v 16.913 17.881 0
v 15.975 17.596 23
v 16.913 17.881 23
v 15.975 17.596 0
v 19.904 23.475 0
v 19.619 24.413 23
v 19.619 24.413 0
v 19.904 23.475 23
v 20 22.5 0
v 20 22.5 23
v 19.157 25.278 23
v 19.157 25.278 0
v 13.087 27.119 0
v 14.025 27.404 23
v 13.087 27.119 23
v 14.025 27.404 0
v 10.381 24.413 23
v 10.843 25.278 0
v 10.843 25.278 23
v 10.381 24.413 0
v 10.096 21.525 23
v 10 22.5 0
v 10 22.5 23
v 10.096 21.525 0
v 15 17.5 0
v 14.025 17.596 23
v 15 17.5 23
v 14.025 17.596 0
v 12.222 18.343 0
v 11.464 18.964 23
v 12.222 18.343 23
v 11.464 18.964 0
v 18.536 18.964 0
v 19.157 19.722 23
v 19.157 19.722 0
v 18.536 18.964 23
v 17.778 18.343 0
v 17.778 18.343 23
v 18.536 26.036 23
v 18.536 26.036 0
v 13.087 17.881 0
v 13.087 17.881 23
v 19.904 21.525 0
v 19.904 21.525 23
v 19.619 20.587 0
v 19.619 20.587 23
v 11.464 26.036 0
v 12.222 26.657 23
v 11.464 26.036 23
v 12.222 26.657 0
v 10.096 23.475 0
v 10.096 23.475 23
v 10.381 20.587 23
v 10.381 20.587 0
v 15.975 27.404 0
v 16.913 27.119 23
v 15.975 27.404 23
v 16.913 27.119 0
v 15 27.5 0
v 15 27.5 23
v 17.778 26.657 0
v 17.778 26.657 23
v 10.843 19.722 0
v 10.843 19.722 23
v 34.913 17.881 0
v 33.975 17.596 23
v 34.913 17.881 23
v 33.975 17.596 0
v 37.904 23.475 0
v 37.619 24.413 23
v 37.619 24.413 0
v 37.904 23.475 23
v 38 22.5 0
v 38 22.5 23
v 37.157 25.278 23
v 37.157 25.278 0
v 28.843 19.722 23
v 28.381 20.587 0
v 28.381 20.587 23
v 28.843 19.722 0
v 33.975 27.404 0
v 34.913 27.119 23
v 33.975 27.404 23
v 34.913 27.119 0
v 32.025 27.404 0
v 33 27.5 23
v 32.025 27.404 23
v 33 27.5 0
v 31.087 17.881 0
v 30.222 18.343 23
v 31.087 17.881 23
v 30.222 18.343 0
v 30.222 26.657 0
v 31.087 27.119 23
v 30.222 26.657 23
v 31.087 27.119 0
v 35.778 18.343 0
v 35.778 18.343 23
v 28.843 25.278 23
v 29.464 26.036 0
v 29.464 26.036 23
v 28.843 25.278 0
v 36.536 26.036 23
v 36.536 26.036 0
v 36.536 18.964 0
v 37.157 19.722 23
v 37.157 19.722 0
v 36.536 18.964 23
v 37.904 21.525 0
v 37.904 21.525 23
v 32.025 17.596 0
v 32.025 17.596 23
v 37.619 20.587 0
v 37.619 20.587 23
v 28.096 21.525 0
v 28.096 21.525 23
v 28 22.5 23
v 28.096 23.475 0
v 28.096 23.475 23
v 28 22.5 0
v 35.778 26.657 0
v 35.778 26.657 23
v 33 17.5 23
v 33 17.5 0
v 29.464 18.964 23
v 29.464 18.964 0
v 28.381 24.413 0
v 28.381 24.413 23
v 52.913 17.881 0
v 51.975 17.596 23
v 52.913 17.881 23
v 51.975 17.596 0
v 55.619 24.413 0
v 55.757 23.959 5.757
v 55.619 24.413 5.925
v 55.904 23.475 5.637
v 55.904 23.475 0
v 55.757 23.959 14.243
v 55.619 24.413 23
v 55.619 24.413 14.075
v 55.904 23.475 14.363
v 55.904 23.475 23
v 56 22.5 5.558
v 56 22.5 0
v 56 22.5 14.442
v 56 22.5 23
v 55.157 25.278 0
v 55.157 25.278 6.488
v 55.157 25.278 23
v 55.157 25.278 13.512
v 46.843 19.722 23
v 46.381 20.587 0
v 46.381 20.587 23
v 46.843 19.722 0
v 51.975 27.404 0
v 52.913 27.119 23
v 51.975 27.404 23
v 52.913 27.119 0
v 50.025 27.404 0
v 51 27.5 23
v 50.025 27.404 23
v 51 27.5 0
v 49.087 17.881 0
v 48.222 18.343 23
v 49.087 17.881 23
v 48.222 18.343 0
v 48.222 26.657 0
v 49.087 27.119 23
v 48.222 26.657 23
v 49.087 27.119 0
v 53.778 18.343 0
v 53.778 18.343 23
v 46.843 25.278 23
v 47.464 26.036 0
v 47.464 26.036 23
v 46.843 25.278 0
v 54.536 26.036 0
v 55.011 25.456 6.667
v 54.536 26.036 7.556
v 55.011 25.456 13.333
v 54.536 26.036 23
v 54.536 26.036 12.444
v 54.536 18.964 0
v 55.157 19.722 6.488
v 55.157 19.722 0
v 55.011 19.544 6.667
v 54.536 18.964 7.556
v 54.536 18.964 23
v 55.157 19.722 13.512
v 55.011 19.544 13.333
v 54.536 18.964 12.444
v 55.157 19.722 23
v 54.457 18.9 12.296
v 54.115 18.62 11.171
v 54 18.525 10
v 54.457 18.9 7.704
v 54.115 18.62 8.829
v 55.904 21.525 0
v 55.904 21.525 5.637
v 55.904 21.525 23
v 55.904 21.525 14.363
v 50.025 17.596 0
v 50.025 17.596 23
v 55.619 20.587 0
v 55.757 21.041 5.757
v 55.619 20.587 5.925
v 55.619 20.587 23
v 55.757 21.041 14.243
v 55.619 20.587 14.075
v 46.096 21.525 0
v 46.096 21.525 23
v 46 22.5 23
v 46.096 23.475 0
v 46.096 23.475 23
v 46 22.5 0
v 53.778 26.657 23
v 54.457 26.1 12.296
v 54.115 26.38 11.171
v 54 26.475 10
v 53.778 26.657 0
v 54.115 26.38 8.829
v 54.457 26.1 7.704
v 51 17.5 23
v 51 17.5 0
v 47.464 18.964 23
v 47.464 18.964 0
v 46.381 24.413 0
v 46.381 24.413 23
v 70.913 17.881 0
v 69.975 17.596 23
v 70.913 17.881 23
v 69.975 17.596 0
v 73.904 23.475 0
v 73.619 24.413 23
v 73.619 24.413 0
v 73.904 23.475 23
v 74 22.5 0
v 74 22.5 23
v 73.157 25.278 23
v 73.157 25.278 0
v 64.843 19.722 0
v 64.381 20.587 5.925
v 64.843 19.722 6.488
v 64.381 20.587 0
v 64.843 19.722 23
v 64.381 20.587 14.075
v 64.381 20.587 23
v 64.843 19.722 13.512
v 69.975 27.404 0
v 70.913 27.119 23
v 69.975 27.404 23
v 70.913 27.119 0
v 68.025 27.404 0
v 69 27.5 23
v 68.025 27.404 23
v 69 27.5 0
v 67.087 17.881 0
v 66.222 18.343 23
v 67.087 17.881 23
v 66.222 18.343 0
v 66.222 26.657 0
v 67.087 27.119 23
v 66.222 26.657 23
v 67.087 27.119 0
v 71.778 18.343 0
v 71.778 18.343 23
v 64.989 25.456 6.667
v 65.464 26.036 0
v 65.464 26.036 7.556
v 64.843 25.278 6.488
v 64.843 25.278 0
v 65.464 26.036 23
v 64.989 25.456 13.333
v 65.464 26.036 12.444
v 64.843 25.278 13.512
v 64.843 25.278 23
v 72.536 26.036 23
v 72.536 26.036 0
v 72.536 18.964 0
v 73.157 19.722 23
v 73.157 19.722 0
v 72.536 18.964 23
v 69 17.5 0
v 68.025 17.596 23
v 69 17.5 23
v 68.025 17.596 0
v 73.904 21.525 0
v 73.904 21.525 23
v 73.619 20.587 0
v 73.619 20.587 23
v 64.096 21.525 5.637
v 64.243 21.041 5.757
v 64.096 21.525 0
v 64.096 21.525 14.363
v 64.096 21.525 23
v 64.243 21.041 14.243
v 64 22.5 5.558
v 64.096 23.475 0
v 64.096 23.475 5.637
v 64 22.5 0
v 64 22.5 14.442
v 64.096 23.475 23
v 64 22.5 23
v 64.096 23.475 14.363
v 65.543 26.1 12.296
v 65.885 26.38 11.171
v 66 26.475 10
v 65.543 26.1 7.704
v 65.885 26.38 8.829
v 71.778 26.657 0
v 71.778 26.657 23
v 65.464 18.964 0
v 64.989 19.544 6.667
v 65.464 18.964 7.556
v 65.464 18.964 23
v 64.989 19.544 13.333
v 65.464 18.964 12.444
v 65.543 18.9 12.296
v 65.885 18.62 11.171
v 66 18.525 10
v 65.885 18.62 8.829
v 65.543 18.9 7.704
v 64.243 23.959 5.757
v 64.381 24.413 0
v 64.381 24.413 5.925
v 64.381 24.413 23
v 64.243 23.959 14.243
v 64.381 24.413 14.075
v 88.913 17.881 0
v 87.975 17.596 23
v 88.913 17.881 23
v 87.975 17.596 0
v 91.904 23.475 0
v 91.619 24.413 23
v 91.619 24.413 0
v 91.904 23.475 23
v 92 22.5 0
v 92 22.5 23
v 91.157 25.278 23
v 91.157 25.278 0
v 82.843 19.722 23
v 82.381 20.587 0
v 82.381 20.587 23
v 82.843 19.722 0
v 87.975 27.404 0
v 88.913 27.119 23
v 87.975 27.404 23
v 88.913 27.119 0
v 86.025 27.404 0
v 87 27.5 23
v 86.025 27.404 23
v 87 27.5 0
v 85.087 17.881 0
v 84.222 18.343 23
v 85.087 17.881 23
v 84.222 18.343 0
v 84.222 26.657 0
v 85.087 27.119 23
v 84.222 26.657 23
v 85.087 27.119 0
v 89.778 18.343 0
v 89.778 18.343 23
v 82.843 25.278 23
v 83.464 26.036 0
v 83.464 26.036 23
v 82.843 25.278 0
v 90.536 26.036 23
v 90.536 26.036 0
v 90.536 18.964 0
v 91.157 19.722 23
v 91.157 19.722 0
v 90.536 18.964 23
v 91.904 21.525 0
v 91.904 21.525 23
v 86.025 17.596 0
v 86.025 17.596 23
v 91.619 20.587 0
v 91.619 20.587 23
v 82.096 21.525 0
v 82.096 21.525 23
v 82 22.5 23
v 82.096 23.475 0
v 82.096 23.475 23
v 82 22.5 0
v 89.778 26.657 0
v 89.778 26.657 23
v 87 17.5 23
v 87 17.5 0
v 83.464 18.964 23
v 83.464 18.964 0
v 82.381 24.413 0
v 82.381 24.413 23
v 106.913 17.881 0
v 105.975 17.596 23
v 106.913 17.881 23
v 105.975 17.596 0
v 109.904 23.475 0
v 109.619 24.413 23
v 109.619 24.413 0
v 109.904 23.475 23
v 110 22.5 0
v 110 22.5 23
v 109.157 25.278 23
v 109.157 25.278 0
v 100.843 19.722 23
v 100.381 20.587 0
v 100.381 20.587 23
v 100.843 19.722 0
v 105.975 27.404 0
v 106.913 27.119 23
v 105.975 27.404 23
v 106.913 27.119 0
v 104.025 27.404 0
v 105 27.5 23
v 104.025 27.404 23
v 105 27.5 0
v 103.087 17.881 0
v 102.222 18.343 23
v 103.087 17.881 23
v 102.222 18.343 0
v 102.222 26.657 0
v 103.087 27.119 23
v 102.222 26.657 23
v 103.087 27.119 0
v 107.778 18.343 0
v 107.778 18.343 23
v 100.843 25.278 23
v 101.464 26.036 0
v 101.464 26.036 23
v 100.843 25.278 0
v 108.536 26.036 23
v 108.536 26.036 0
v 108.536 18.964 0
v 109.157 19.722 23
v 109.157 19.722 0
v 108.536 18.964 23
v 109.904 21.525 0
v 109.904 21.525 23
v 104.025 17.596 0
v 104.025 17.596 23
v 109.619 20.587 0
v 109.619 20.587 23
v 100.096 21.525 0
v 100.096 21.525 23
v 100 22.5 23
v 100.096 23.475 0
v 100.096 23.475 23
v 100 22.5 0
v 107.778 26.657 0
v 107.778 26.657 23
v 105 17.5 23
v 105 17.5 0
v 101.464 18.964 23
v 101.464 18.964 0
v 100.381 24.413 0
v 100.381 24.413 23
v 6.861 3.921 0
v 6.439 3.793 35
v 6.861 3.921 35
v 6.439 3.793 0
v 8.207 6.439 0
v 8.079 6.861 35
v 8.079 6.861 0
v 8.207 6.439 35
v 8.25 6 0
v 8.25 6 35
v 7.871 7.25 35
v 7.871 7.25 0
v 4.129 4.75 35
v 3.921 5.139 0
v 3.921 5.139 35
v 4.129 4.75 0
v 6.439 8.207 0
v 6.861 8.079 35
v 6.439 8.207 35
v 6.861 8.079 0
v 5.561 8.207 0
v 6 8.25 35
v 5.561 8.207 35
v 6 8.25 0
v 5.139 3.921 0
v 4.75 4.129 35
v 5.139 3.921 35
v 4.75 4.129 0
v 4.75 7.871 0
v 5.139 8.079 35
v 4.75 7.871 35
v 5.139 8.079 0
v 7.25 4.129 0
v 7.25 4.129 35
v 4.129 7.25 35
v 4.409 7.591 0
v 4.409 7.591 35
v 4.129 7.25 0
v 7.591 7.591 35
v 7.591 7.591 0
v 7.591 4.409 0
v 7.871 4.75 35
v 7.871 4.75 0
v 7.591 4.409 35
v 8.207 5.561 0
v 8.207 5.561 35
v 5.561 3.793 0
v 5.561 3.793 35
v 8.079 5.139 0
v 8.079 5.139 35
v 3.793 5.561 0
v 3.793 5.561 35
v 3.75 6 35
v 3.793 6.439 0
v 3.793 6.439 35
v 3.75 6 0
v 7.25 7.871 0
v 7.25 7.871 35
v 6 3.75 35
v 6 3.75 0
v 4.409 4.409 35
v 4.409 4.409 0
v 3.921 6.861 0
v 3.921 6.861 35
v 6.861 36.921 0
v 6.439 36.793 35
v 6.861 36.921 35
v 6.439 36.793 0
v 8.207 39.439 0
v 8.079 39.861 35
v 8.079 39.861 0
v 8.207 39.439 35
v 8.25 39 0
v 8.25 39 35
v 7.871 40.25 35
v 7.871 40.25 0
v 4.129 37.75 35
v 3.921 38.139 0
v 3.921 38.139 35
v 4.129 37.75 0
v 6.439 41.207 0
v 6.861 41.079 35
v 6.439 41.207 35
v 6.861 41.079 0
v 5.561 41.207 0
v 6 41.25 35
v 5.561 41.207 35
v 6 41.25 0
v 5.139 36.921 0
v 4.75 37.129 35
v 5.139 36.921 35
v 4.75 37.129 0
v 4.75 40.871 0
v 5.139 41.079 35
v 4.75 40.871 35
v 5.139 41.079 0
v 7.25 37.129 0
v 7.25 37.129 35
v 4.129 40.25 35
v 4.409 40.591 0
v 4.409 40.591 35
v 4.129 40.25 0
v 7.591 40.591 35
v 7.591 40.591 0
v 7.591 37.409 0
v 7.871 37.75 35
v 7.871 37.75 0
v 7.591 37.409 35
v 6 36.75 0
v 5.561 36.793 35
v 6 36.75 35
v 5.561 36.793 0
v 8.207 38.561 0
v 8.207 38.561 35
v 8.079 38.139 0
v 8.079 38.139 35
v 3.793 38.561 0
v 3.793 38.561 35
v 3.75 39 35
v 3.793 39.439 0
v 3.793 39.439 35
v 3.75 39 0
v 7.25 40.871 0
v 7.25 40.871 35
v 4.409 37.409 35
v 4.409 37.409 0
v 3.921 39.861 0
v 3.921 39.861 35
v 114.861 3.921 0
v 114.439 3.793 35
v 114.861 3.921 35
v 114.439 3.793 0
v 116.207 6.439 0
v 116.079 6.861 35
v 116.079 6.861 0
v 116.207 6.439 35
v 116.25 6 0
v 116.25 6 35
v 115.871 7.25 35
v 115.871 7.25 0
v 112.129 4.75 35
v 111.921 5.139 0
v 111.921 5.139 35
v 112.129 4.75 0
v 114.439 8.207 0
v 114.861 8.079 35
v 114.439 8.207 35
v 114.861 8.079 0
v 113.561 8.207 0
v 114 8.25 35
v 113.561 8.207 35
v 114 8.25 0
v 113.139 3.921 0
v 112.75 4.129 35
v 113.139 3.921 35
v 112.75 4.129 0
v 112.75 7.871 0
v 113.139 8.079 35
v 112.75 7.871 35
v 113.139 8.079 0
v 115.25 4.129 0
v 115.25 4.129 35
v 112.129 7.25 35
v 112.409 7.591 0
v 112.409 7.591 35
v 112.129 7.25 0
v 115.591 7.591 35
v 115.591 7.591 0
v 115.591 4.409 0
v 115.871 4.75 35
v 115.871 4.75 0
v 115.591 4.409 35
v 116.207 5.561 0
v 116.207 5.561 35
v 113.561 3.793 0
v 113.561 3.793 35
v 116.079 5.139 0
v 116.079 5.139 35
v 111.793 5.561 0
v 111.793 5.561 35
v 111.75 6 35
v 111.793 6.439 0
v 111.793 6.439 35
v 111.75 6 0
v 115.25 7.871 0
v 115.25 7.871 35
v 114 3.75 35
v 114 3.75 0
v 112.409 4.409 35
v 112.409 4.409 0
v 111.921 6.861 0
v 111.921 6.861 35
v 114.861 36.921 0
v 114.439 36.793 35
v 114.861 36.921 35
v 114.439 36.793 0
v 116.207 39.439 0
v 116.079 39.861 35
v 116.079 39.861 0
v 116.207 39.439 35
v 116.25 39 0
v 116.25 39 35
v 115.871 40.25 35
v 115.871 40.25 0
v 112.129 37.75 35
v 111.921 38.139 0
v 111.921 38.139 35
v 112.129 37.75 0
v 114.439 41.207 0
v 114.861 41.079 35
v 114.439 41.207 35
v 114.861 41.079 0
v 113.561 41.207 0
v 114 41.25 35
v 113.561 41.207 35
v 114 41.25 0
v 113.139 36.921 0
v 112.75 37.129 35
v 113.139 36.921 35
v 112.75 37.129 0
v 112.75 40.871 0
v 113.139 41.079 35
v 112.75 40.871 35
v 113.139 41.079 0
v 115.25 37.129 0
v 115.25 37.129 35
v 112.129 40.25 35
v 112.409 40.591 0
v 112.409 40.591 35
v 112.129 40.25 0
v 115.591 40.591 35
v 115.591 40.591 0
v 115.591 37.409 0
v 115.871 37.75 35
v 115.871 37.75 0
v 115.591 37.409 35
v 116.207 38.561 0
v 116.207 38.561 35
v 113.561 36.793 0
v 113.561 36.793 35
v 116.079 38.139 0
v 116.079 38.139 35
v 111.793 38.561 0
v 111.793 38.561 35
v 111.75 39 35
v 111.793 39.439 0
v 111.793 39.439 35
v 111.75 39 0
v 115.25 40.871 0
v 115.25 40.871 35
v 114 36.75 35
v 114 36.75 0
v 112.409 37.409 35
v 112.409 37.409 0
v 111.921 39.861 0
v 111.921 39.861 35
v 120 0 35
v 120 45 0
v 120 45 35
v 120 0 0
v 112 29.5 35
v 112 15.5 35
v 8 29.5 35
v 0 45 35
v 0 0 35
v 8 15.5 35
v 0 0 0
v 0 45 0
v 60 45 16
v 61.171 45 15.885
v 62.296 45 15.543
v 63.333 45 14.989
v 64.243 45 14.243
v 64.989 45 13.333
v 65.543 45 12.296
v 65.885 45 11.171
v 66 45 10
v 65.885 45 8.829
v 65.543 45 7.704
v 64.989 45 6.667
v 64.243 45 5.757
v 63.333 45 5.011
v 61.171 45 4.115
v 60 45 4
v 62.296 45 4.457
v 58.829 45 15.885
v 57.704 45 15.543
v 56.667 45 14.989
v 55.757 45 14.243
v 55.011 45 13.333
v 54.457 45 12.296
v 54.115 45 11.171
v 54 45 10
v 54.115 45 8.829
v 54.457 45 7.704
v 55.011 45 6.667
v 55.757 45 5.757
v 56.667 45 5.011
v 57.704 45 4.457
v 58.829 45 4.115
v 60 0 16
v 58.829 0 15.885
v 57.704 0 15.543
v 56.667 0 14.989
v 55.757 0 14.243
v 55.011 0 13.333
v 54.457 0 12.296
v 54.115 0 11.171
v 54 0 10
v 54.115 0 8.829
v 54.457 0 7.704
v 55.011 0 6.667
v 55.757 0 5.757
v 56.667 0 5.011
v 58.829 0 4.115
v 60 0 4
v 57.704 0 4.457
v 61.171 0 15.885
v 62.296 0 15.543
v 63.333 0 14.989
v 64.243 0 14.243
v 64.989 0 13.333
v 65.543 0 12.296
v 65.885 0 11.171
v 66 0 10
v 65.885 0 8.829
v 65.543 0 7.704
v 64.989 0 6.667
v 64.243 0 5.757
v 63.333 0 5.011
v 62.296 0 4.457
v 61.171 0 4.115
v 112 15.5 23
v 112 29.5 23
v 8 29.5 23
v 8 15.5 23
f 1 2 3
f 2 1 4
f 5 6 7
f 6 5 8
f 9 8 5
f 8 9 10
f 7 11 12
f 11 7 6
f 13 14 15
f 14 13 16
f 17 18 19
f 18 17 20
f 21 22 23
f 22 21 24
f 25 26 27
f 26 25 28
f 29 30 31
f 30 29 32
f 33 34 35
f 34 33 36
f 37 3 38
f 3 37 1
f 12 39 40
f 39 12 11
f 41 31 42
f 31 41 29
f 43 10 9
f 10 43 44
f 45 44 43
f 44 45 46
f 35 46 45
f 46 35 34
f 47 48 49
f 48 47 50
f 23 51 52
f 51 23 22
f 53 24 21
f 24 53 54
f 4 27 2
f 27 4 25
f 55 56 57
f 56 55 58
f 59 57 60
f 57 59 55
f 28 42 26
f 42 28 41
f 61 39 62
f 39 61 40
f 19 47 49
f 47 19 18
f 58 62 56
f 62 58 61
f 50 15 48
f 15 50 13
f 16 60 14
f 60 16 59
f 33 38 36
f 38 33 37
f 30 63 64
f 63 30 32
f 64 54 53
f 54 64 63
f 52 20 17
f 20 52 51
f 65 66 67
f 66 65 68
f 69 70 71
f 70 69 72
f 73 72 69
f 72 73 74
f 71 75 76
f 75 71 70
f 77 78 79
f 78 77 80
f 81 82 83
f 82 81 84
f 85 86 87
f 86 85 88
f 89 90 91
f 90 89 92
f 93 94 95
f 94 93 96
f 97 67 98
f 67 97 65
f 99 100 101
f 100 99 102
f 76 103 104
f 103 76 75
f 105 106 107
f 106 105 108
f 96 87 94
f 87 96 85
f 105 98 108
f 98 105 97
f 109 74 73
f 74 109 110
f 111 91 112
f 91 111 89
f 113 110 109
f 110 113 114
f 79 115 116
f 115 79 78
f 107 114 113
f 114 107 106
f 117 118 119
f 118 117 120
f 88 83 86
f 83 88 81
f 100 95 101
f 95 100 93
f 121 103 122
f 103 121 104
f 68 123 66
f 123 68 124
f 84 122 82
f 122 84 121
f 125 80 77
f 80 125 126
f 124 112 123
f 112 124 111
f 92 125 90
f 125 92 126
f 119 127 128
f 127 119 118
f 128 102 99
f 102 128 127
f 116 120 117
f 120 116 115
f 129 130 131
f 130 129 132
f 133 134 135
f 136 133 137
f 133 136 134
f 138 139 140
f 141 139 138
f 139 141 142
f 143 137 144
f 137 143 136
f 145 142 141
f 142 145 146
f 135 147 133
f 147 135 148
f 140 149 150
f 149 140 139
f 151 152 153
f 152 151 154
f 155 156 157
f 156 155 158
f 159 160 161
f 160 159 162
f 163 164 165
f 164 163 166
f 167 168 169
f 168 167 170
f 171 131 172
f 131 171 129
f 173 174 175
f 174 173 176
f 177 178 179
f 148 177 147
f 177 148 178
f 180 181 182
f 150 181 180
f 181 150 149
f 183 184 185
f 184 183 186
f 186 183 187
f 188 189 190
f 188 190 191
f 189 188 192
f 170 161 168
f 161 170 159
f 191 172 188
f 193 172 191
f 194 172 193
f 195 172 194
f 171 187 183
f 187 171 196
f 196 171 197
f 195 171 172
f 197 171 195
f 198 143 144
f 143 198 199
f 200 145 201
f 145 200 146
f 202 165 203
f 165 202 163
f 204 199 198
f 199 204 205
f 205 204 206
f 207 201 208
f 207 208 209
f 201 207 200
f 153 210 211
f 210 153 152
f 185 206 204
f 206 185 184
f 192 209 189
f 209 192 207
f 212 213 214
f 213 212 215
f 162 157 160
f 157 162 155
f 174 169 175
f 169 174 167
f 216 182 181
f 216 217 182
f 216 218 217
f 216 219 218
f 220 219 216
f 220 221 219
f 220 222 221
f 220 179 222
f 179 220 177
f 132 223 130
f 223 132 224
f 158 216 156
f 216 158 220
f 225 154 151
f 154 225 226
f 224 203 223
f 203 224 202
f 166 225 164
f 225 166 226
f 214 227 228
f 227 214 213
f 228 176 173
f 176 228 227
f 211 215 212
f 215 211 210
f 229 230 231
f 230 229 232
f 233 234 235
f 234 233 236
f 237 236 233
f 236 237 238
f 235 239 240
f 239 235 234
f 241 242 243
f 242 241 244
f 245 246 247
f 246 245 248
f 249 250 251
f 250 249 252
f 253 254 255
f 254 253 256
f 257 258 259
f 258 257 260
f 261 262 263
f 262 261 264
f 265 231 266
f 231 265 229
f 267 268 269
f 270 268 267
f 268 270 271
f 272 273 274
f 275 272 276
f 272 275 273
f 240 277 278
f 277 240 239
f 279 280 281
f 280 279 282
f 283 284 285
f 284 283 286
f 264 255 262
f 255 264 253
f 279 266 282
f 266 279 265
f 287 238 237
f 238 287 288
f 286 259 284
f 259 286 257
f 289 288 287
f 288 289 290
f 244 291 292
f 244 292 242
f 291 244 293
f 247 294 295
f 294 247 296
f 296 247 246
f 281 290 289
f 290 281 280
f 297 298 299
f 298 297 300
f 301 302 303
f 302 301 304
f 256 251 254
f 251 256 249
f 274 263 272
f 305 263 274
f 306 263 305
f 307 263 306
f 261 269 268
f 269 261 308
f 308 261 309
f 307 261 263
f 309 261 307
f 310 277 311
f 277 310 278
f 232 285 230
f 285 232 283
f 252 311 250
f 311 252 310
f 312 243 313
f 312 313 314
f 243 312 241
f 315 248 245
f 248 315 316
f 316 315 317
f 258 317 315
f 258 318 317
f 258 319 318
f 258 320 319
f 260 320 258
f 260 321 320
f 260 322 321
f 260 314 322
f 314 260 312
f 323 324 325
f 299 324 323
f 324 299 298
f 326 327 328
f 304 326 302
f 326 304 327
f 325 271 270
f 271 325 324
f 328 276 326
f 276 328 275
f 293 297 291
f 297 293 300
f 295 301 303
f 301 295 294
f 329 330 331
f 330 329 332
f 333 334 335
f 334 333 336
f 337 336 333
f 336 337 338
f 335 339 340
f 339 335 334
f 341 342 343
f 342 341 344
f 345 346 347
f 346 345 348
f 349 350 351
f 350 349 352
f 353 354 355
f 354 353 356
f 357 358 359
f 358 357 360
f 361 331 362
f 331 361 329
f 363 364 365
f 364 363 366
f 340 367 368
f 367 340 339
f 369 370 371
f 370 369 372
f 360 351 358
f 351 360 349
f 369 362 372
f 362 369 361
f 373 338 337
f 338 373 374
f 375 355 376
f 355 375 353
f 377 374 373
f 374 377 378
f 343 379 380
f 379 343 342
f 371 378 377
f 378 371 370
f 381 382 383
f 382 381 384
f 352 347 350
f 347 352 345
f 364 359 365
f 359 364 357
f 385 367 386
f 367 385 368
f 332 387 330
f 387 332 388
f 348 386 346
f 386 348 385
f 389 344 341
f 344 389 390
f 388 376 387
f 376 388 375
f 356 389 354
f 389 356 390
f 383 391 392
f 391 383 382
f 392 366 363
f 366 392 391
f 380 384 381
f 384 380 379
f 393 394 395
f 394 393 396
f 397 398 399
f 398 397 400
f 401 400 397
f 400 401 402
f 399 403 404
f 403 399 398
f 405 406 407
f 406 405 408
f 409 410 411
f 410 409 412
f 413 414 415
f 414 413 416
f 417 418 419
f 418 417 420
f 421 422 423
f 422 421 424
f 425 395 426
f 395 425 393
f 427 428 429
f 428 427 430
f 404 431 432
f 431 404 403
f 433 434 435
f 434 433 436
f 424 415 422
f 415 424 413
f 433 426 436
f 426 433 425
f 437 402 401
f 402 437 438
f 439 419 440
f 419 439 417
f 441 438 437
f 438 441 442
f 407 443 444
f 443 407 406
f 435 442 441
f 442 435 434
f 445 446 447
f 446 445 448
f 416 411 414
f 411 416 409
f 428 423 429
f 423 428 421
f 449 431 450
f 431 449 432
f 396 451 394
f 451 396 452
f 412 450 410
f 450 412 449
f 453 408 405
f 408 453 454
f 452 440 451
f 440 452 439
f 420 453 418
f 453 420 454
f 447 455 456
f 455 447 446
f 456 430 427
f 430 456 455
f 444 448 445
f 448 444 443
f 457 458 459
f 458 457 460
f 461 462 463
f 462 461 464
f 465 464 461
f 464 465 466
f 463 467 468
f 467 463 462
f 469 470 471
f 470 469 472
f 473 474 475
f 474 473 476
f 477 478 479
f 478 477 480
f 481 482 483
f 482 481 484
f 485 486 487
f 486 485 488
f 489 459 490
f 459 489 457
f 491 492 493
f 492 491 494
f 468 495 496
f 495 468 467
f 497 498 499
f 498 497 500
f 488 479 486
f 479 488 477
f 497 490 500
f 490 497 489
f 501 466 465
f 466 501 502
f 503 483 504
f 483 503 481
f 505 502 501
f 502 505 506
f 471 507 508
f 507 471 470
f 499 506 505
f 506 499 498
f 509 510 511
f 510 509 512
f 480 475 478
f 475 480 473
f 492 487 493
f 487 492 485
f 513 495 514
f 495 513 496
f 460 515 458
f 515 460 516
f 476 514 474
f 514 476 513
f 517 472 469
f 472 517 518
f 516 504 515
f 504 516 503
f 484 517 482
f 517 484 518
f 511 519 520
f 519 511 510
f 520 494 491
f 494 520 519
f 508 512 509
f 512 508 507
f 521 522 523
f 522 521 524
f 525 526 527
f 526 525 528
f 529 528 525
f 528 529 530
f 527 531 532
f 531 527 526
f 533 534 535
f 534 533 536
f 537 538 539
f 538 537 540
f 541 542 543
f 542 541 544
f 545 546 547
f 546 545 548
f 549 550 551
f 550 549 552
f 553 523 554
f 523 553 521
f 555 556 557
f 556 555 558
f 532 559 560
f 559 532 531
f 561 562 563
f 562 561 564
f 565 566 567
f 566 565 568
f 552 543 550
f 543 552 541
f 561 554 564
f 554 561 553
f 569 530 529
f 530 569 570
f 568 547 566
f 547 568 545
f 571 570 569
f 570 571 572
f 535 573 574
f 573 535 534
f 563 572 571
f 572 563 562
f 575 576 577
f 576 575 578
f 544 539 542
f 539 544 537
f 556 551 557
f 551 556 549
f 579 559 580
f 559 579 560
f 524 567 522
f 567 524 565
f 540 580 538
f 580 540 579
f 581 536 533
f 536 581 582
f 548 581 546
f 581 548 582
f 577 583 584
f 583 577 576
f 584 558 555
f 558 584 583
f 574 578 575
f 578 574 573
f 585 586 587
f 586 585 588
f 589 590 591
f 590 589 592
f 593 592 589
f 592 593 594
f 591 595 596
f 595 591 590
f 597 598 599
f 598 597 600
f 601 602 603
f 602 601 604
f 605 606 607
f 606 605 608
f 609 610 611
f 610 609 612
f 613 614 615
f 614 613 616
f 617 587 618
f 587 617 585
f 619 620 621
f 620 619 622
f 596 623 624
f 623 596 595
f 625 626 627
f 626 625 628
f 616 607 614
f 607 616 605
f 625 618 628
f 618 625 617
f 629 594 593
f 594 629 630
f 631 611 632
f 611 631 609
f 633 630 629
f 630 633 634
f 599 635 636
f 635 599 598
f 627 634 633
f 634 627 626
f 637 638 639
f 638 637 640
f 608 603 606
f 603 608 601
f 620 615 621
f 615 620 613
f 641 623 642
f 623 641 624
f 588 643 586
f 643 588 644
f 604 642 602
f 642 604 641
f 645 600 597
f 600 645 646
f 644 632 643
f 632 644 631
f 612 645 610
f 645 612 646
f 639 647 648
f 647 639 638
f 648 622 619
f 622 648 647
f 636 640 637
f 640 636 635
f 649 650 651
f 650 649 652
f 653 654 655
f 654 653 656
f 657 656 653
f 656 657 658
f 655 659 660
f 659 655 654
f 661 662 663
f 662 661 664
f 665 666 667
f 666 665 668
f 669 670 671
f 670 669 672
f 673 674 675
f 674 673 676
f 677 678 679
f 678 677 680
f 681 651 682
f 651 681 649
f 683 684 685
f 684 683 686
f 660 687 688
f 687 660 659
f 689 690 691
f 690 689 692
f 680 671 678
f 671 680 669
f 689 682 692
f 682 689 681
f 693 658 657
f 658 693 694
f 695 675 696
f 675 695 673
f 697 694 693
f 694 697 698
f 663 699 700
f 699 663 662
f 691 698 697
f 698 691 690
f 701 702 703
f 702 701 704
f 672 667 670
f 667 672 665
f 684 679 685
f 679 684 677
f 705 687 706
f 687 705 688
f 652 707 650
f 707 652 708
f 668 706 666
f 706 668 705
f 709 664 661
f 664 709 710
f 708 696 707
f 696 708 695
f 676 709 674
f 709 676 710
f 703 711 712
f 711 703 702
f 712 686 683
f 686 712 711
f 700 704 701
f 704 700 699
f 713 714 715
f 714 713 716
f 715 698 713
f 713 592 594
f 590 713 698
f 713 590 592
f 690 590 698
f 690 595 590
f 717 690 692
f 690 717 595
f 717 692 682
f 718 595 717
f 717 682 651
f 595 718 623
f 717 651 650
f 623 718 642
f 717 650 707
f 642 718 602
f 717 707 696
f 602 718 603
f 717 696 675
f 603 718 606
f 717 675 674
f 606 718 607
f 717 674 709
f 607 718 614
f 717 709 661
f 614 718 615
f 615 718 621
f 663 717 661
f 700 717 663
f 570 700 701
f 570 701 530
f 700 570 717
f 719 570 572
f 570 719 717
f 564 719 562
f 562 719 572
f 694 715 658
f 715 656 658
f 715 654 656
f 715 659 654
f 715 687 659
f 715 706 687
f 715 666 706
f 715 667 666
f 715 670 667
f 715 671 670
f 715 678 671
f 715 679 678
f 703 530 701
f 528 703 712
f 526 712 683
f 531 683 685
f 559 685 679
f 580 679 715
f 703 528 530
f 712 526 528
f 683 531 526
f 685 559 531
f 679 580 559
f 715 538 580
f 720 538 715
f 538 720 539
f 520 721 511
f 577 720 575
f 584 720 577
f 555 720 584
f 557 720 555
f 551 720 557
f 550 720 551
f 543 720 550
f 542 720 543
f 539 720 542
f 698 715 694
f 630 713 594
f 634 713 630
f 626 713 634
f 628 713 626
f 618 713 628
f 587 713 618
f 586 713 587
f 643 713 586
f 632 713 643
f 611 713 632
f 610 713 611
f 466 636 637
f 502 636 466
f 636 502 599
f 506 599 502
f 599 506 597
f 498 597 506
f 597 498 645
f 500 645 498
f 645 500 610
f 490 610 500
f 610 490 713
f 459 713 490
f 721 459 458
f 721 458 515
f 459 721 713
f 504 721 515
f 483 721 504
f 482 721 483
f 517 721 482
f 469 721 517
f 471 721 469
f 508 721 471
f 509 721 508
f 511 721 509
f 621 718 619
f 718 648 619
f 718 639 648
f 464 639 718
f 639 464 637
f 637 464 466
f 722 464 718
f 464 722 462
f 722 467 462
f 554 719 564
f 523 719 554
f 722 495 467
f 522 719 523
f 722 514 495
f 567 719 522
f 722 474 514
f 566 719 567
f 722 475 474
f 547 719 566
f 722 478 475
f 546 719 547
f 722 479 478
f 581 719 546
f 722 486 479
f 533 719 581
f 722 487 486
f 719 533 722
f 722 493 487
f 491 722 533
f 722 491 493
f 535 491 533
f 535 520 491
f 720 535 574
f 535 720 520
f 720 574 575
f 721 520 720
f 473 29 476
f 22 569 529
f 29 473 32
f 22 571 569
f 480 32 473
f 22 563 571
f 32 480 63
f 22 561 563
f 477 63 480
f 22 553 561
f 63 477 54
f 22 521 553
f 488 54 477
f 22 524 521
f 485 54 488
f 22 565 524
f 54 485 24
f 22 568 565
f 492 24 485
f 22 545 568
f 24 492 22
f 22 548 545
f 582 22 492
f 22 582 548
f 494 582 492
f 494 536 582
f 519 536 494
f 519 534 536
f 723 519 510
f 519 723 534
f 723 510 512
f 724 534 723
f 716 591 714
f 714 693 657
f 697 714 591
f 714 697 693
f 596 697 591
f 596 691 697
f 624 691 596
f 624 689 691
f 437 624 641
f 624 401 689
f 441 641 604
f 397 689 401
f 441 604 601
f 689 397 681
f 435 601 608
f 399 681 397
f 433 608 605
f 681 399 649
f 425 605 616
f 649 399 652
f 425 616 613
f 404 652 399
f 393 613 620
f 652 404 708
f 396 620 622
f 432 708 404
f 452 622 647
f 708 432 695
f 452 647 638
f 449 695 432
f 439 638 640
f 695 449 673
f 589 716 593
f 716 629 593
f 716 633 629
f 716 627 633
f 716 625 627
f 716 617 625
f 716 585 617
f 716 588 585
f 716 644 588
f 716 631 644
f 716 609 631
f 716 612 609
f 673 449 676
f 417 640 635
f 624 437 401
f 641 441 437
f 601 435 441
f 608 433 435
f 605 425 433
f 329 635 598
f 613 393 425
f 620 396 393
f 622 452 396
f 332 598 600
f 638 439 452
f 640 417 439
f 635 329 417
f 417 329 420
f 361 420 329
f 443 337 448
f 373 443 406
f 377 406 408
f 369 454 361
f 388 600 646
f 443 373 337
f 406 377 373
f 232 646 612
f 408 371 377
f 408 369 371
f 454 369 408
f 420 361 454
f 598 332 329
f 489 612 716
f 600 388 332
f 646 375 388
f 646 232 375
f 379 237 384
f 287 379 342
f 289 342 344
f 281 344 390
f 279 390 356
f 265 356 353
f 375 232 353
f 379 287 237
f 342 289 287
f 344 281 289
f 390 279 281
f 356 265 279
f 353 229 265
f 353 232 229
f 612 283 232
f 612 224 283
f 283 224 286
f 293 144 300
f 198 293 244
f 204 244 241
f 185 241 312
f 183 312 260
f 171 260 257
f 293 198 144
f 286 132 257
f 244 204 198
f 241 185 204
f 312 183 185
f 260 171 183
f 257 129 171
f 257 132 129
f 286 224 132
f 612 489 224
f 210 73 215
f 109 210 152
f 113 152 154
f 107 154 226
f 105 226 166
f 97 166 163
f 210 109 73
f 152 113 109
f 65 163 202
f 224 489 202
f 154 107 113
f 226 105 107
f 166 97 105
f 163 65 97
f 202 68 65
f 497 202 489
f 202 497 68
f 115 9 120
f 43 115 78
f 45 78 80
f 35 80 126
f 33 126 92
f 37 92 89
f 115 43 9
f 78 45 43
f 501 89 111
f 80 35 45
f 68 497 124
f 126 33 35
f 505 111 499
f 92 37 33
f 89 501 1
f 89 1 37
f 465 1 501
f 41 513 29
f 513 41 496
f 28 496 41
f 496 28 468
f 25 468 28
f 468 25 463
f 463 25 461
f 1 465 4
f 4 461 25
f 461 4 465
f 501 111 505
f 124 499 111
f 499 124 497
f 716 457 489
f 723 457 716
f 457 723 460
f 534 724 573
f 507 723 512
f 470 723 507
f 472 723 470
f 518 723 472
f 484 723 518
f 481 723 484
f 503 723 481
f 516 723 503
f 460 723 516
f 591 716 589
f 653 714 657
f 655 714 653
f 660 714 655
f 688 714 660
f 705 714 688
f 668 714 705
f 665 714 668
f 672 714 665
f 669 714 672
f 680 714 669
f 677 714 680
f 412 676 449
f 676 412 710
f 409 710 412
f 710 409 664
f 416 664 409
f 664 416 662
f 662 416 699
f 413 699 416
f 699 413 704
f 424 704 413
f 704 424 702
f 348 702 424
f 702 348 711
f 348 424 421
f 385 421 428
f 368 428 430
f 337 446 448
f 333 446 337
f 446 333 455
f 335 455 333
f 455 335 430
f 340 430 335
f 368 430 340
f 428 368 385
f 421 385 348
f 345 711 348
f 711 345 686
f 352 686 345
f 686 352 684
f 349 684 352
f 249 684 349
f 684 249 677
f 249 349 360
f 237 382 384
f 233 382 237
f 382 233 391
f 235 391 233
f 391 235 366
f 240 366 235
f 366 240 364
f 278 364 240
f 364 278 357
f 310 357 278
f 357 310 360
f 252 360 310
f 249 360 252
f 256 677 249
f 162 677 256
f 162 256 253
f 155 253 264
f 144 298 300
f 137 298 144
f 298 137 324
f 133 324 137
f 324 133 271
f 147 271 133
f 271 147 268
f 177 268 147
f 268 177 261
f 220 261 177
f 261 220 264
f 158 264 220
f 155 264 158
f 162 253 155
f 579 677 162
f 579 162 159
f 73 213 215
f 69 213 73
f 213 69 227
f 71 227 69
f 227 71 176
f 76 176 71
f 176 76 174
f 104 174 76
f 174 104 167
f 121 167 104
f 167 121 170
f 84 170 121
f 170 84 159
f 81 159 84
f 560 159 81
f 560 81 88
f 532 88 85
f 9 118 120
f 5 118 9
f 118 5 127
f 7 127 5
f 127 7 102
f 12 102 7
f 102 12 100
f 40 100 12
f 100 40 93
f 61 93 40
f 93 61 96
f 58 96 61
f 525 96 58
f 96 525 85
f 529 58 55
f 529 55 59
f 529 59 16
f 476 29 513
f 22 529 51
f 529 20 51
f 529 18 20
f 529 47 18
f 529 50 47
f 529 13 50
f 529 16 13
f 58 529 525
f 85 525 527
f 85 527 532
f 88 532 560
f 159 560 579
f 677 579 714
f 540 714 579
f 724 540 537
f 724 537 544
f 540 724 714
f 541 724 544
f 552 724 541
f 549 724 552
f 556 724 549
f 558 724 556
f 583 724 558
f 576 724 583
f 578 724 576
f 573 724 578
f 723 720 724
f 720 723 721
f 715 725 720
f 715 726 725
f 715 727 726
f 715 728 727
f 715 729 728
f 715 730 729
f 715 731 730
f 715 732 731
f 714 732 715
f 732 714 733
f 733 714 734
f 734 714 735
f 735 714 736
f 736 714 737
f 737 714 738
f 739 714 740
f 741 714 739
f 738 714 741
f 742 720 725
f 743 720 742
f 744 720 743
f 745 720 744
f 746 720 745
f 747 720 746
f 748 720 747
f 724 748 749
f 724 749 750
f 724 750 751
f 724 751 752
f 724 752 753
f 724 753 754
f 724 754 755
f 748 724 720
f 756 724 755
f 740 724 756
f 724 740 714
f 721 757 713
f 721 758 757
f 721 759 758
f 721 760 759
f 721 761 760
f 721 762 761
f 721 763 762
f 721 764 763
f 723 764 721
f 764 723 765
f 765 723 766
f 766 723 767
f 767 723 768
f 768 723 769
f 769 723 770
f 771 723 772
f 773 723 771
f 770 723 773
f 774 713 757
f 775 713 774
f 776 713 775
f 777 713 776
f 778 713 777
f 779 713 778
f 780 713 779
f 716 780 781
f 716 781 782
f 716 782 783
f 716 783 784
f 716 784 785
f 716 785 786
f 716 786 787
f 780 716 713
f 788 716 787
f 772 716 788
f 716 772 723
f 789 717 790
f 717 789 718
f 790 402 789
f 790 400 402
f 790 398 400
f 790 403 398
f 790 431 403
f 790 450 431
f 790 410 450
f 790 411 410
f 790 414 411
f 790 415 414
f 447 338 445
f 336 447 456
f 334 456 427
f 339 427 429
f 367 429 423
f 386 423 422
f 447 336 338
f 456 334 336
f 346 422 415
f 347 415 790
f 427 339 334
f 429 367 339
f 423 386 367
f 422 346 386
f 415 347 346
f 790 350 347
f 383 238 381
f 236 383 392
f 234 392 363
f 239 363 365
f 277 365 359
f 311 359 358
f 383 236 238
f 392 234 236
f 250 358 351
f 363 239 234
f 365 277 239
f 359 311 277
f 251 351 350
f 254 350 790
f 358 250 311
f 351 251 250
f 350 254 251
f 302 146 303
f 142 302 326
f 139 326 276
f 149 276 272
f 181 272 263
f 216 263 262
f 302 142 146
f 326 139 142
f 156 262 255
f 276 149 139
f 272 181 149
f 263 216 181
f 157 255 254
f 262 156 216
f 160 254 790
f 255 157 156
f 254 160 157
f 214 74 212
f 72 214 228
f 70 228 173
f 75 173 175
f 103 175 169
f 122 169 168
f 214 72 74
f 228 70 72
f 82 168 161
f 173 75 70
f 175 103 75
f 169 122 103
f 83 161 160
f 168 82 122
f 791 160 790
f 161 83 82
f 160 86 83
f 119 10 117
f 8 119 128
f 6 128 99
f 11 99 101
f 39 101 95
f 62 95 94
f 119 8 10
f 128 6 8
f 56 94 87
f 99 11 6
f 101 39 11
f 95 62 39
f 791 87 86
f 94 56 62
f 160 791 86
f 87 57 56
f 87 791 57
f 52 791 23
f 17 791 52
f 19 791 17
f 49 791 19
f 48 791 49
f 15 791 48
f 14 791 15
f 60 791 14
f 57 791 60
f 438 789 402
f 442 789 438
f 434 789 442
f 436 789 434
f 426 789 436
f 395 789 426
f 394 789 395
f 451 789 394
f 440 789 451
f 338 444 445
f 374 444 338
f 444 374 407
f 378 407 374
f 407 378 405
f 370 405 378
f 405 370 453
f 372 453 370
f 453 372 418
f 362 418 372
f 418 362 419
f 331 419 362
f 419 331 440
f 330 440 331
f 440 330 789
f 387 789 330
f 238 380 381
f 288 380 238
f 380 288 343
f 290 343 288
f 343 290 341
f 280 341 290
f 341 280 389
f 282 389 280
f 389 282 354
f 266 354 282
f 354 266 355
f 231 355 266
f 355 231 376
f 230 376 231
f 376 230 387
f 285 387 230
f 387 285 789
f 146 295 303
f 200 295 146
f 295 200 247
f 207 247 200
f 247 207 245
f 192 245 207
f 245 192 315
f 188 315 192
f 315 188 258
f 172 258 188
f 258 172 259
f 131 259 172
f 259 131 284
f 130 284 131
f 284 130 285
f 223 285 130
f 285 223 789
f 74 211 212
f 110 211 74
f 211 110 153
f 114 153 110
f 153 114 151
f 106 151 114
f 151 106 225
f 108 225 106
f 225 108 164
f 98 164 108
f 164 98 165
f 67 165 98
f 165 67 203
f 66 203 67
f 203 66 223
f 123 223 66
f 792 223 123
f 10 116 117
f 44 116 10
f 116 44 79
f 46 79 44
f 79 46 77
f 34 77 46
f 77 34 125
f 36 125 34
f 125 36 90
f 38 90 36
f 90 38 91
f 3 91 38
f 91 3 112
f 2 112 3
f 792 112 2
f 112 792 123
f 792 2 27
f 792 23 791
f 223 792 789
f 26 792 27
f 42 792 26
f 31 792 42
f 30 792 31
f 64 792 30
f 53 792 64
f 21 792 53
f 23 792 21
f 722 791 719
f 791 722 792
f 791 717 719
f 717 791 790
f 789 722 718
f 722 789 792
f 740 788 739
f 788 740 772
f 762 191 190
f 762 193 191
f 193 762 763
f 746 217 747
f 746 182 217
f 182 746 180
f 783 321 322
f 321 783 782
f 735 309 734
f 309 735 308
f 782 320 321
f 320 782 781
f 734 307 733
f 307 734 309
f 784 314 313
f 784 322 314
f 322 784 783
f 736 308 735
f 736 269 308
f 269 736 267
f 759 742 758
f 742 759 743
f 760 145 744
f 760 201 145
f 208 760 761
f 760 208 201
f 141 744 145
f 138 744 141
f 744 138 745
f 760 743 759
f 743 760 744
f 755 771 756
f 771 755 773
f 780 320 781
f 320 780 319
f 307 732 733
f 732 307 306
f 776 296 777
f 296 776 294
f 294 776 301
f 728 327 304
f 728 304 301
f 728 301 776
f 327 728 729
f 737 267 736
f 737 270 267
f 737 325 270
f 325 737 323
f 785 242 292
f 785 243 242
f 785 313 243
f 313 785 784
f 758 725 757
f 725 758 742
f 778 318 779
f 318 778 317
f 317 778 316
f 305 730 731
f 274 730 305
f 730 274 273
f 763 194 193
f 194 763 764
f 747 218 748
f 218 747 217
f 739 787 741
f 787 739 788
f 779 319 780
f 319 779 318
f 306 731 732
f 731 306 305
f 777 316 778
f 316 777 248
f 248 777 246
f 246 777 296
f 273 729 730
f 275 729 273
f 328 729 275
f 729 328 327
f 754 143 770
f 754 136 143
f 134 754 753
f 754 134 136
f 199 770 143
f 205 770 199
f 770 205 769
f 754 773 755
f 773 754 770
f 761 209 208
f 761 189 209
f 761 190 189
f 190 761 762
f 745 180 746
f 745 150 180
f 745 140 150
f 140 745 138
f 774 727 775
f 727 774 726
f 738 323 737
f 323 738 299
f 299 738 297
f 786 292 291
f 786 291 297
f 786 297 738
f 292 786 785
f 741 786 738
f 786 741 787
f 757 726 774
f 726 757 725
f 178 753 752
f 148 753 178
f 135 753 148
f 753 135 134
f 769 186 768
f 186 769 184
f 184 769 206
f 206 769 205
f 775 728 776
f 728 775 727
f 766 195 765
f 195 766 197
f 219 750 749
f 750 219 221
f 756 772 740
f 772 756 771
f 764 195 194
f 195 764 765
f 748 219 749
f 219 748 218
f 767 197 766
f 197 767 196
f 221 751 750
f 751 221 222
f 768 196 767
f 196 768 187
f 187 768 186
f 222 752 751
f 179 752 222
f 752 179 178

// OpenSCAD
$fn = 32;

// ----------------------------------------------------------------------
// Manifold block: side_outlet manifold
// ----------------------------------------------------------------------

// --- parameters (mm) ---
block_l = 120;            // block length, X
block_w = 45;             // block width, Y
block_h = 35;             // block height, Z
port_d = 10;              // port bore diameter
port_pitch = 18;          // port pitch along X
gallery_d = 14;           // top gallery width, Y
gallery_depth = 12;       // gallery pocket depth
wall_p = 8;               // gallery end wall thickness, X
mnt_d = 4.5;              // mounting hole diameter
mnt_in = 6;               // mounting hole inset from the edges
out_d = 12;               // outlet bore diameter
out_z = 10;               // outlet axis height
fit_tol = 0.02;           // tolerance for press fits, mm
free_tol = 0.2;           // tolerance for clearance fits, mm

n_ports = 6;  // ports in the row
port_x0 = (block_l - (n_ports - 1) * port_pitch) / 2;  // first port X

difference() {
  cube([block_l, block_w, block_h]);
  for (i = [0 : n_ports - 1])
    translate([port_x0 + i * port_pitch, block_w / 2, -1])
      cylinder(h = block_h + 2, d = port_d);
  translate([wall_p, block_w / 2 - gallery_d / 2, block_h - gallery_depth])
    cube([block_l - 2 * wall_p, gallery_d, gallery_depth + 1]);
  for (cx = [mnt_in, block_l - mnt_in])
    for (cy = [mnt_in, block_w - mnt_in])
      translate([cx, cy, -1]) cylinder(h = block_h + 2, d = mnt_d);
  translate([block_l / 2, -1, out_z]) rotate([-90, 0, 0])
    cylinder(h = block_w + 2, d = out_d);
}
